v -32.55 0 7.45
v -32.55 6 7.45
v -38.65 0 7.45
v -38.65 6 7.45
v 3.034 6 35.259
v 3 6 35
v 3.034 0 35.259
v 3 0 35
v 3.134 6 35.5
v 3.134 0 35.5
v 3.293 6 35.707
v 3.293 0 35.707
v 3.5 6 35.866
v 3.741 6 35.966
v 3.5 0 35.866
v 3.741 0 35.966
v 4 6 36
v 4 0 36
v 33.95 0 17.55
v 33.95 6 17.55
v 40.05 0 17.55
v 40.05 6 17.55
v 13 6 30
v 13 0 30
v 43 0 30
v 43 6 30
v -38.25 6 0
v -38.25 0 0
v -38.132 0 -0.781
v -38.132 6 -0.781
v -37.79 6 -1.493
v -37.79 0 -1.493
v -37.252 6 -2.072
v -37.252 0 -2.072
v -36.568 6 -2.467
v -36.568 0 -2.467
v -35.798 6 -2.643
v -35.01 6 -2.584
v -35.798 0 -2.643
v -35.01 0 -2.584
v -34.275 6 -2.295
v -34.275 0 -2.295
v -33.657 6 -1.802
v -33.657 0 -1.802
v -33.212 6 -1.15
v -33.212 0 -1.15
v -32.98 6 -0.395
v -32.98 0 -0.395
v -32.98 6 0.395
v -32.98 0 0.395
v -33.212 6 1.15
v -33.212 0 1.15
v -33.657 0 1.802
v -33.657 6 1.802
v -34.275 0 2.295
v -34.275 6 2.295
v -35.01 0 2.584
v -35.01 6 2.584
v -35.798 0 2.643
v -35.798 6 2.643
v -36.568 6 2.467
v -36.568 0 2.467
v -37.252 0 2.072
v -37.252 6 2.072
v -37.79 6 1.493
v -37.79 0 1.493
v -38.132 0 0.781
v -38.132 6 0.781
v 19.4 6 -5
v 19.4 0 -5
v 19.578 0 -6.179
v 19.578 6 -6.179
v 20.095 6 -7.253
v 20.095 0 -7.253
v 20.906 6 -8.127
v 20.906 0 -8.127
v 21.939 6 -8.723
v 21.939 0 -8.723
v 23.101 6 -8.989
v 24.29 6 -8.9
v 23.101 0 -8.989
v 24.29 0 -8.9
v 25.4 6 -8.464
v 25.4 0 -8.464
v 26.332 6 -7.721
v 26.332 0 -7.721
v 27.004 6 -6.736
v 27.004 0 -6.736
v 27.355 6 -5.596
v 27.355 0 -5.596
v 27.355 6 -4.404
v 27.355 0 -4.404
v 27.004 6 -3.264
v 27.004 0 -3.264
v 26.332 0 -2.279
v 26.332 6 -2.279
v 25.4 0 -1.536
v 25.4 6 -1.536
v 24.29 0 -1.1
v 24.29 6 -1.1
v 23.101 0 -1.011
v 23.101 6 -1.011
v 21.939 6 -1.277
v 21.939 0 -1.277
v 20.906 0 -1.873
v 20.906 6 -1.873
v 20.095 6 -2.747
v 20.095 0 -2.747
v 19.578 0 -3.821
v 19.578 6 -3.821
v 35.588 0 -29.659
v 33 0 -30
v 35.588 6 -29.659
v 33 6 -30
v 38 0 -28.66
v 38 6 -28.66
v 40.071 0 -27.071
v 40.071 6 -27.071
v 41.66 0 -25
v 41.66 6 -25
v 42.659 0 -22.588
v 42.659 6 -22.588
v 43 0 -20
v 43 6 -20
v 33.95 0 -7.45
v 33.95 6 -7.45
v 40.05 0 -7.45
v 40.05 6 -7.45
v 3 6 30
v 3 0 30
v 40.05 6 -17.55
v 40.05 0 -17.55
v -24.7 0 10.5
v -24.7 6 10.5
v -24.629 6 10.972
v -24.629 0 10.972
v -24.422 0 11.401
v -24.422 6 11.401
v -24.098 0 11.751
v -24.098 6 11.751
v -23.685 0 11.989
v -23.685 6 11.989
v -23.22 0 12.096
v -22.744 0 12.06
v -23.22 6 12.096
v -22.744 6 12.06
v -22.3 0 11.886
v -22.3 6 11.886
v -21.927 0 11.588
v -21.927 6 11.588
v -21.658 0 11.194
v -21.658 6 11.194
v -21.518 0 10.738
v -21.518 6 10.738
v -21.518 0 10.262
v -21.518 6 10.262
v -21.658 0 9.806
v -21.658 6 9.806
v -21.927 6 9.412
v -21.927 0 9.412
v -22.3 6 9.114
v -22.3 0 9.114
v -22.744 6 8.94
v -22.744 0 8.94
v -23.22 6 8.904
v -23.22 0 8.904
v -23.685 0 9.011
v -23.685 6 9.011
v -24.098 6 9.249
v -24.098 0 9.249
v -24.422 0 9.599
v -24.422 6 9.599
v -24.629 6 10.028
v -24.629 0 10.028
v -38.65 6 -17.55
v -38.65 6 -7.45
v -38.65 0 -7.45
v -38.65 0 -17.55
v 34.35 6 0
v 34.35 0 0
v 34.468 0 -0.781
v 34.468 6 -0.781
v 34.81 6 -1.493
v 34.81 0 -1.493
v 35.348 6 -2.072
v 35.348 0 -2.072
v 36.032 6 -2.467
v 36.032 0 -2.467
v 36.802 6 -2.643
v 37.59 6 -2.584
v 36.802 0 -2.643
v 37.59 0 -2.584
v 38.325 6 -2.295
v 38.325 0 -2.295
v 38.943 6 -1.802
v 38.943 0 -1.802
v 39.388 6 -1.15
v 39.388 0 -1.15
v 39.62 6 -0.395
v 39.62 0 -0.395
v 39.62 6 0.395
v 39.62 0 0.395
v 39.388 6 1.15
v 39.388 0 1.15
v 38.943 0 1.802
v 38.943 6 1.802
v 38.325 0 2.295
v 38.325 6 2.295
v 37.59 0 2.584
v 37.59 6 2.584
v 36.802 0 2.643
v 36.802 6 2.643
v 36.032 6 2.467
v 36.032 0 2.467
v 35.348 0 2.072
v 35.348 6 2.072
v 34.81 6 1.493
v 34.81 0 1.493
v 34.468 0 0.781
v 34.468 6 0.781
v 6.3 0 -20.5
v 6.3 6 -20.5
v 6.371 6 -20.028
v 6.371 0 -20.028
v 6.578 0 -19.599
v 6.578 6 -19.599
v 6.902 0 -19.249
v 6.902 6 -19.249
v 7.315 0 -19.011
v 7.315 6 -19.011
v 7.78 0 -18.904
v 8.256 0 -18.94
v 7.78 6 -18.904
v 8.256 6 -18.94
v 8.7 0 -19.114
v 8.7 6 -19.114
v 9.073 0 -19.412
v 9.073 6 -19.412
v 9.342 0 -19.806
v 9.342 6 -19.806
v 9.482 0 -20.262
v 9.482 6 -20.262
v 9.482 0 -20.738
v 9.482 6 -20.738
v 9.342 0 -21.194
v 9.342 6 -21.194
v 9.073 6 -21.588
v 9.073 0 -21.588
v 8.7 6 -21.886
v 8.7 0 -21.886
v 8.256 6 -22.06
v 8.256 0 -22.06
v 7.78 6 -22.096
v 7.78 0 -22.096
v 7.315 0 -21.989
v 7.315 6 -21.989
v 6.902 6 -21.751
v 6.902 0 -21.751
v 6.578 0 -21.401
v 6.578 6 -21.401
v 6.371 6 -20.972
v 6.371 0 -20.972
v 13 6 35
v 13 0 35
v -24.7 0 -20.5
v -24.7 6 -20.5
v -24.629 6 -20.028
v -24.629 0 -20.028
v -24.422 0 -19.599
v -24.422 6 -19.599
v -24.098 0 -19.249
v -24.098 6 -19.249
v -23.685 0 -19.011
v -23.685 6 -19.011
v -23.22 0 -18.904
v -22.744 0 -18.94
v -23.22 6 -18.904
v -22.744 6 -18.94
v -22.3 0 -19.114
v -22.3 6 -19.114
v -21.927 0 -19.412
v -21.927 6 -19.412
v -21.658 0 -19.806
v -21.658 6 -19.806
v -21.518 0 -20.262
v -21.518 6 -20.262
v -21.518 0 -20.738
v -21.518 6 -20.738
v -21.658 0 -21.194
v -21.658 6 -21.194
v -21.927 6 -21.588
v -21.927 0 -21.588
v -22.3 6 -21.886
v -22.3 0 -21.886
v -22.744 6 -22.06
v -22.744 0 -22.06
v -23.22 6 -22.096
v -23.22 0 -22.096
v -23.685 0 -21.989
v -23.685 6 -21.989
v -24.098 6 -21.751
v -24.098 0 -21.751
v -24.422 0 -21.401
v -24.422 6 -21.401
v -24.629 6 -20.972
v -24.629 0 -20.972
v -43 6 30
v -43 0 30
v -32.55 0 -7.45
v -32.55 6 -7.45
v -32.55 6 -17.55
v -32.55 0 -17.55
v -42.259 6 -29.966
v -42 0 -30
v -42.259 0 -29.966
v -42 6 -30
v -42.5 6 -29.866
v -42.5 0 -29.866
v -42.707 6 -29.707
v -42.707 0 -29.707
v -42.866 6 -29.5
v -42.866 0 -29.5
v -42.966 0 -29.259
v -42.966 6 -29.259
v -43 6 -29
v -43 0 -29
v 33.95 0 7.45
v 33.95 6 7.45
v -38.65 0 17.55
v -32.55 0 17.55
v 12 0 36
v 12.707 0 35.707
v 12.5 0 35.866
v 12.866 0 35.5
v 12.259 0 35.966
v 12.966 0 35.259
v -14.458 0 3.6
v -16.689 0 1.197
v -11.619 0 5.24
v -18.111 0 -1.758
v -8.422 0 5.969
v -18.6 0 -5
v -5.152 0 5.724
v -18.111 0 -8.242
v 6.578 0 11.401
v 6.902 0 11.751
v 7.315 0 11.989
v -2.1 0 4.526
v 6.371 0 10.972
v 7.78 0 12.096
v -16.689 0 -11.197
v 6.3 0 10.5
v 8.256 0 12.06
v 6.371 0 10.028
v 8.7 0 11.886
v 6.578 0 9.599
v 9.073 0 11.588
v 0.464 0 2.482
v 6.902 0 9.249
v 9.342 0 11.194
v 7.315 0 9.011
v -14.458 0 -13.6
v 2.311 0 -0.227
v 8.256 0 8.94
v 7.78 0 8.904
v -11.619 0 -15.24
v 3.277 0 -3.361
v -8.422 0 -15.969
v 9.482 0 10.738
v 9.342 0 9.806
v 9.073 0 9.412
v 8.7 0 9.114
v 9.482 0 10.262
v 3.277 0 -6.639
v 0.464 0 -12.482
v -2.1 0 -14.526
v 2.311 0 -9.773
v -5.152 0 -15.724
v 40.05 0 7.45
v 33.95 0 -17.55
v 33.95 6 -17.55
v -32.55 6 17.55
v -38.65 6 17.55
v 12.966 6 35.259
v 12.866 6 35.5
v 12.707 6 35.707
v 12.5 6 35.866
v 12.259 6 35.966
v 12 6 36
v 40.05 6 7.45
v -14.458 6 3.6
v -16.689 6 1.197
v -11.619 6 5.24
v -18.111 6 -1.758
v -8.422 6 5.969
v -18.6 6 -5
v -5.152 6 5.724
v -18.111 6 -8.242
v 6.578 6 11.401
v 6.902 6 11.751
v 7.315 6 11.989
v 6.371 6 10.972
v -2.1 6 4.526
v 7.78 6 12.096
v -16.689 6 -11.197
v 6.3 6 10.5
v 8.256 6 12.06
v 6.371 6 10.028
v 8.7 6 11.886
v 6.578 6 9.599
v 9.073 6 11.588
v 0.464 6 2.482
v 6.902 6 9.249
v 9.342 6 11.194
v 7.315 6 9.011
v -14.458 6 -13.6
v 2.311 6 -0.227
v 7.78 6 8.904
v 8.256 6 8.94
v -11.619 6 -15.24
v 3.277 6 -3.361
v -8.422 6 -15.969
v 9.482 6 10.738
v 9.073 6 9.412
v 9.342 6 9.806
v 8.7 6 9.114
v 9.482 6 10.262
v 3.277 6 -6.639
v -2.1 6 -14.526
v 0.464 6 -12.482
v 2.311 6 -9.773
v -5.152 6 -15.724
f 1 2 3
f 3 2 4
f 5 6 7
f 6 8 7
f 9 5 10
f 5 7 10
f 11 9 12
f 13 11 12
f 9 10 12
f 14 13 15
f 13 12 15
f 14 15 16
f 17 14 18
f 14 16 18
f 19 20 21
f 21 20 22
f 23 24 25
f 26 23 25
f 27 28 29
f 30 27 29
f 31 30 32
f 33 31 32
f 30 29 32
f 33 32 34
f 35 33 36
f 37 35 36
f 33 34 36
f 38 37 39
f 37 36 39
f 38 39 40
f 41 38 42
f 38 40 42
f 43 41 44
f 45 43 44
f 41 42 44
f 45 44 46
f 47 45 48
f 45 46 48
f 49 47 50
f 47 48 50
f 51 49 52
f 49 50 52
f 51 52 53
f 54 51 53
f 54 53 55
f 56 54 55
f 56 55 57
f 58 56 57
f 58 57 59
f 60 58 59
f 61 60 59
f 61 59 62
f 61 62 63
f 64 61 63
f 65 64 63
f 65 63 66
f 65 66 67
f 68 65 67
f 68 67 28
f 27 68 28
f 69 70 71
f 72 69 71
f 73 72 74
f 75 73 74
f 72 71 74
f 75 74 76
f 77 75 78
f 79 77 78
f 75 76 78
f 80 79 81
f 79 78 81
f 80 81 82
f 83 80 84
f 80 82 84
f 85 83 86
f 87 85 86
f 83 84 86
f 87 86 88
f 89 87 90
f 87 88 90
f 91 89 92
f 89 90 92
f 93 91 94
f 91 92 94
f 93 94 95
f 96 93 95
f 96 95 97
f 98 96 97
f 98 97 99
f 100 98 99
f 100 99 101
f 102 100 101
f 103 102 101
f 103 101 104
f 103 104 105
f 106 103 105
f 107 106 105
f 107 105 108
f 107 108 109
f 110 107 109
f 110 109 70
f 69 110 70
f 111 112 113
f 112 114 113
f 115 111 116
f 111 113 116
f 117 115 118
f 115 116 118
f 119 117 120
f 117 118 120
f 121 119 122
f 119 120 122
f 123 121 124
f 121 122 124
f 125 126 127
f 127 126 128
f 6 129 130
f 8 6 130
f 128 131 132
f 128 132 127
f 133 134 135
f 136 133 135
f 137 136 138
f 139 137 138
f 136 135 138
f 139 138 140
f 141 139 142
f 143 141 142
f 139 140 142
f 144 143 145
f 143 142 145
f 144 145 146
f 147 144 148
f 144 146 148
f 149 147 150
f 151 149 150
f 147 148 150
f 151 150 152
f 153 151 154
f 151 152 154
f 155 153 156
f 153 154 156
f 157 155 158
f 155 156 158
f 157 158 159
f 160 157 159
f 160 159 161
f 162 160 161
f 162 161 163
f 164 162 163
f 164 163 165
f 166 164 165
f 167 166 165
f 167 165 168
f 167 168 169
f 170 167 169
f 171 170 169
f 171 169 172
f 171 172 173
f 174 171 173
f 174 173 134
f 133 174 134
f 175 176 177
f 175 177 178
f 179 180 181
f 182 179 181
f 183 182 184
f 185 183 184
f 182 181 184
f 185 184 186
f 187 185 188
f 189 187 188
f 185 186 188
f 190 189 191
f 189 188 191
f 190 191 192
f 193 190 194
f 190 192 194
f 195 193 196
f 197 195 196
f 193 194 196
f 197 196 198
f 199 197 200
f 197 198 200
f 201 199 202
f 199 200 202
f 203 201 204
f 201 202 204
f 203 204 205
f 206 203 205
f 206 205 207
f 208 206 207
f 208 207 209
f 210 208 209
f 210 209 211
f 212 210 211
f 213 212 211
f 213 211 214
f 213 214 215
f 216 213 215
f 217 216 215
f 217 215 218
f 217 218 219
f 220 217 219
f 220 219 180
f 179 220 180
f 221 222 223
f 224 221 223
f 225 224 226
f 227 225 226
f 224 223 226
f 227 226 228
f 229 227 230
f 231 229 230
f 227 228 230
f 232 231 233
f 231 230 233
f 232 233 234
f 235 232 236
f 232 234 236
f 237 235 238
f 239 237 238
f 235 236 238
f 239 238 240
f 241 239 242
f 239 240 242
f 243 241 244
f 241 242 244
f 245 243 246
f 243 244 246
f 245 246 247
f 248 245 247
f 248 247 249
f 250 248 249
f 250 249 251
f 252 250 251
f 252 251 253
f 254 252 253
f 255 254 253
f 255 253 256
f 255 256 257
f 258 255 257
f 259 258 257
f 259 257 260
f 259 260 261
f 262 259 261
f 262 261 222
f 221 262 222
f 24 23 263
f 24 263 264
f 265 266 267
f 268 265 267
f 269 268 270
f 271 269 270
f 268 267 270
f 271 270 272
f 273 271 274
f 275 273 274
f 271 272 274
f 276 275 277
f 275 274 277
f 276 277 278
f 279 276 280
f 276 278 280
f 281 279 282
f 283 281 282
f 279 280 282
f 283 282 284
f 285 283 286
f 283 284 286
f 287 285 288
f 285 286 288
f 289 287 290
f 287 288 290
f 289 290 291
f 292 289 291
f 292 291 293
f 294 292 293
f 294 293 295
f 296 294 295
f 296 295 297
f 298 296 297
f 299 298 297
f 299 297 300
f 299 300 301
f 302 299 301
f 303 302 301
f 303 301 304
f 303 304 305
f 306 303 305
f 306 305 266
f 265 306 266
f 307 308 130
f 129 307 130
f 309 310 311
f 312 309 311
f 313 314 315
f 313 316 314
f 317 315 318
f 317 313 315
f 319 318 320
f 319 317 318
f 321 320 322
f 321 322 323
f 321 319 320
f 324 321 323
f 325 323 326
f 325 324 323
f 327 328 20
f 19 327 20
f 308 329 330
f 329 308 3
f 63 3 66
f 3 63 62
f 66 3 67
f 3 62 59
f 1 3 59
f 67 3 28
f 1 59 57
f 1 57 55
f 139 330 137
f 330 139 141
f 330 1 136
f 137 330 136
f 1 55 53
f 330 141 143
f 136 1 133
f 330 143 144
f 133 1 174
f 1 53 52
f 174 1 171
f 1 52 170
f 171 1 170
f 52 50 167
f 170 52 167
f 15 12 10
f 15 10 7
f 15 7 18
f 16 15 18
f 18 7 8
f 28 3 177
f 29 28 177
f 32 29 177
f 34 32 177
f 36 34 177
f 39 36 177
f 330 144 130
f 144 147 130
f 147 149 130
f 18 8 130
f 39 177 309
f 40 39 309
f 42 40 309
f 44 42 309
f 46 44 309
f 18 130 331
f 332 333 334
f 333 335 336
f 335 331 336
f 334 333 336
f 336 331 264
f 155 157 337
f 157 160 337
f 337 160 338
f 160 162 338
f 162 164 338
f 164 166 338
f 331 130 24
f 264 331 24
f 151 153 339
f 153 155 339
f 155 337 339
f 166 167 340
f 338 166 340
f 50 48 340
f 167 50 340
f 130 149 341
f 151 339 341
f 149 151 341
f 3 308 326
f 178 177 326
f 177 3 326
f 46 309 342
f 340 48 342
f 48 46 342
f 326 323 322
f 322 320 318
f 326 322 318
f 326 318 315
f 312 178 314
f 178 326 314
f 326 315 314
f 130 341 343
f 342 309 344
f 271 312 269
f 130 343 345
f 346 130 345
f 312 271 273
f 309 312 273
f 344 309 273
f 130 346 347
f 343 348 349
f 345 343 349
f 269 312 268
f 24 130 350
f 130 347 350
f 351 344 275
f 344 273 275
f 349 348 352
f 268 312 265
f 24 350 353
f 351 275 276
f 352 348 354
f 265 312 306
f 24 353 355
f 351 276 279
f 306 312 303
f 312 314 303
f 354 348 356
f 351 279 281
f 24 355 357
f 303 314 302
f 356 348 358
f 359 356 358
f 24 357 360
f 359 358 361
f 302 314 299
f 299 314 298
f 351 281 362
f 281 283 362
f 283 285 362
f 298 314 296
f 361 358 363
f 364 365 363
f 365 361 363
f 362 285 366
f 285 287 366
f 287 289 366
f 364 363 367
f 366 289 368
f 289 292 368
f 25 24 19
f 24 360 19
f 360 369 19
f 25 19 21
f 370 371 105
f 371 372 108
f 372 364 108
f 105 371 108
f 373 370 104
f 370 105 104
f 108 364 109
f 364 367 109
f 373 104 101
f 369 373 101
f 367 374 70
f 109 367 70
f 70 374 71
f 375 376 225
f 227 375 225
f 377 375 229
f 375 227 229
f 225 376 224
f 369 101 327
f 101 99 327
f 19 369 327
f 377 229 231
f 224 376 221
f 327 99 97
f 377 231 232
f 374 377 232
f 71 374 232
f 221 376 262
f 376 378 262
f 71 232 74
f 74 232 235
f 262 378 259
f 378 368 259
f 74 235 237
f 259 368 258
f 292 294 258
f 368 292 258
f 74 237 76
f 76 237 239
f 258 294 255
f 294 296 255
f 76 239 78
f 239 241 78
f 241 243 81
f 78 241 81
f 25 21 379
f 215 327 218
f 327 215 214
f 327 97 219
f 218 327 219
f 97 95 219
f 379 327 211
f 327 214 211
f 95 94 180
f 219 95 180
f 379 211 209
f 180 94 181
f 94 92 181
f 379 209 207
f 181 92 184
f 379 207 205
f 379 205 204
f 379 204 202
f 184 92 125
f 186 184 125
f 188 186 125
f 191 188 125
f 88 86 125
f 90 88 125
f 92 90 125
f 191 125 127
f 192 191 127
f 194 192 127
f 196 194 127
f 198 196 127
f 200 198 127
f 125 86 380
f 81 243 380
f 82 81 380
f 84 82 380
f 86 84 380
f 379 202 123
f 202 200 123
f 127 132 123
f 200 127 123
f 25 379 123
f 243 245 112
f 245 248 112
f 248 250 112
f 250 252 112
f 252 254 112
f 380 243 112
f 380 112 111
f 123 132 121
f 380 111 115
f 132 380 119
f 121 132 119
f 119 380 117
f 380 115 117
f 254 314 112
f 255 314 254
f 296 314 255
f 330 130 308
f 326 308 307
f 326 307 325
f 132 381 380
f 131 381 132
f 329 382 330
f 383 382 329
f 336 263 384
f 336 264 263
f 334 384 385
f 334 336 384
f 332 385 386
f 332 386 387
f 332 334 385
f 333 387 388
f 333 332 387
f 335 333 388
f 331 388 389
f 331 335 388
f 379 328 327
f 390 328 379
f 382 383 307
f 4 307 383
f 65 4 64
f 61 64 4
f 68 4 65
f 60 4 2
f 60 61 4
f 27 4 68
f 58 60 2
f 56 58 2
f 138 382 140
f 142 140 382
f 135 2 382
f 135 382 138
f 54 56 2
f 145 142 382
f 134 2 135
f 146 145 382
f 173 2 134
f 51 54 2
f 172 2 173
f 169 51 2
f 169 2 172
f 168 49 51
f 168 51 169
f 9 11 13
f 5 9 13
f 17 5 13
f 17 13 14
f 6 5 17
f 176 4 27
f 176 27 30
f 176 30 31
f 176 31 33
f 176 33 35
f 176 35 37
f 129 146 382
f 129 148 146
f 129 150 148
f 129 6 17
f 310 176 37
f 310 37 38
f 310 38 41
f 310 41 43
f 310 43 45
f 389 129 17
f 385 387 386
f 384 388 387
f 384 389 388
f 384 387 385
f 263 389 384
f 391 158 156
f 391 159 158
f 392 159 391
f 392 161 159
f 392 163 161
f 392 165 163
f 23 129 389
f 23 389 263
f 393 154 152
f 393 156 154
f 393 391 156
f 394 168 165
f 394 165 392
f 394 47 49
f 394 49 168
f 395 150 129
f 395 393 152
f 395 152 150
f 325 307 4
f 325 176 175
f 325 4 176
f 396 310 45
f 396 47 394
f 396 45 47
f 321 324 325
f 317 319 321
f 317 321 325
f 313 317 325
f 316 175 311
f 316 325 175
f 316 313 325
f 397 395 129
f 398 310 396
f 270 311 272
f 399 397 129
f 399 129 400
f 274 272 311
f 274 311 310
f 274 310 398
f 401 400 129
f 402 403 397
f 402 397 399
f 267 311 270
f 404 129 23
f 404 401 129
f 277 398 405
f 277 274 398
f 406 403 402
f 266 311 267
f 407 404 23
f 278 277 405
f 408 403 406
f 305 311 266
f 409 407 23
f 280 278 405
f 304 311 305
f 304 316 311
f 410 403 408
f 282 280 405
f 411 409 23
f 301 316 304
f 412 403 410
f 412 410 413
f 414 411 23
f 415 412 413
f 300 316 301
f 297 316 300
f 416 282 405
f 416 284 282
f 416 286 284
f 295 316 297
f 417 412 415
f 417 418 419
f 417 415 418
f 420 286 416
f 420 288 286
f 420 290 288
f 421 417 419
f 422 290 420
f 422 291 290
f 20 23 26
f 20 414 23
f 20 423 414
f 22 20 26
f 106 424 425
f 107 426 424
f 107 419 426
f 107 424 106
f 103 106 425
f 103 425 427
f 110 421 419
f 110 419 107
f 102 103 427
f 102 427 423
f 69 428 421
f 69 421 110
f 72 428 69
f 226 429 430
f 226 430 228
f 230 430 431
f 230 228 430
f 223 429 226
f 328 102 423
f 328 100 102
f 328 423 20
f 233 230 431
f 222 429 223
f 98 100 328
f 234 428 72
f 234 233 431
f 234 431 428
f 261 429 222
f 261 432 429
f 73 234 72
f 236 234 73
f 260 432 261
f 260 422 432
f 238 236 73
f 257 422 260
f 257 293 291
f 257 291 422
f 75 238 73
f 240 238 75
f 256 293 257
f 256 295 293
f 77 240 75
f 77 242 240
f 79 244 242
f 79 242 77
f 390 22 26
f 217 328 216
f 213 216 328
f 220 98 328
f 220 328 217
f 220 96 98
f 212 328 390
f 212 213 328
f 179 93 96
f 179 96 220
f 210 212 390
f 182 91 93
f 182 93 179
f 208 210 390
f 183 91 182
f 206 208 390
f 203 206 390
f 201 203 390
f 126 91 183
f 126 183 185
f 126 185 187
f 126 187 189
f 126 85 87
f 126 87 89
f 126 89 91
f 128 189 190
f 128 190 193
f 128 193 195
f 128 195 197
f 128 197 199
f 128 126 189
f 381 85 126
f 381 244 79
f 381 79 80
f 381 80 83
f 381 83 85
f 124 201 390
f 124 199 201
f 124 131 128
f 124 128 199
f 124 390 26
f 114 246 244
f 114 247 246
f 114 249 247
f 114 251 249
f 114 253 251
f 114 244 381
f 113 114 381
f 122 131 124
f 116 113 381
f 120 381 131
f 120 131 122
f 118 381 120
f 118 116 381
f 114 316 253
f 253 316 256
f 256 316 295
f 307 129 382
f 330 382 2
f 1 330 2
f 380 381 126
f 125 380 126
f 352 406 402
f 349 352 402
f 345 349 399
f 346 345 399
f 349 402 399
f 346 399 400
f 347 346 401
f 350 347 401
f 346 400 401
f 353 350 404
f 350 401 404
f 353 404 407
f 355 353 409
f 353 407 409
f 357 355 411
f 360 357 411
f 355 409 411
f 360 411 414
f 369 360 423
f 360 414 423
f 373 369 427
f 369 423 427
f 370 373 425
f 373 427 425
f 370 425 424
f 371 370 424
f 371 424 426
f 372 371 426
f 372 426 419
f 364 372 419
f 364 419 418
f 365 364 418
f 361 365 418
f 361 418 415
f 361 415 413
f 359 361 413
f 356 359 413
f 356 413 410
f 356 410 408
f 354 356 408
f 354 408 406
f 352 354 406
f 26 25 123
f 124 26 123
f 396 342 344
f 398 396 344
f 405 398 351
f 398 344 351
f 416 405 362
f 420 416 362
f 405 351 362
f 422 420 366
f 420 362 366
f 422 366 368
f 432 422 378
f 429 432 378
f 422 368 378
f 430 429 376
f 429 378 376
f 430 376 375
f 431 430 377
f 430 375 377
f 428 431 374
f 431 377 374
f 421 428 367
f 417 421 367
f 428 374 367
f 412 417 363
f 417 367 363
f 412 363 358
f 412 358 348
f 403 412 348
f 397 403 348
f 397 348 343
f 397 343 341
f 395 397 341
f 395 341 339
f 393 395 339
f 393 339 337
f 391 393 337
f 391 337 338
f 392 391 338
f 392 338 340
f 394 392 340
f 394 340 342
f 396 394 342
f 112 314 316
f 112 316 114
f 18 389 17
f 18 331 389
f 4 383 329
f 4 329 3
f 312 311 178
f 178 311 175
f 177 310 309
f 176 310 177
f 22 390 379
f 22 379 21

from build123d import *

# Parameters (mm, degrees)
SKETCH1_W                = 86
SKETCH1_H                = 60
BOSS_EXTRUDE1_DEPTH      = 6
M5_CLEARANCE_HOLE1_D     = 5.3
FILLET1_R                = 10
M5_CLEARANCE_HOLE2_D     = 5.3
F_8_0_8_DIAMETER_HOLE1_D = 8
M3_CLEARANCE_HOLE1_D     = 3.2
SKETCH6_R                = 11
CUT_EXTRUDE3_DEPTH       = 7
FILLET1343_R             = 1
SKETCH73_W               = 6.1
SKETCH73_H               = 10.1
CUT_EXTRUDE24_DEPTH      = 4
CUT_EXTRUDE24_DEPTH_BACK = 4
SKETCH74_W               = 6.1
SKETCH74_H               = 10.1
CUT_EXTRUDE25_DEPTH      = 4
CUT_EXTRUDE25_DEPTH_BACK = 4
SKETCH2349_W             = 10
SKETCH2349_H             = 6
BOSS_EXTRUDE2347_DEPTH   = 6
FILLET1346_R             = 1


with BuildPart() as part:
    # Sketch1 → Boss-Extrude1 (new body)
    with BuildSketch(Plane(origin=(0, 0, 0), x_dir=(1, 0, 0), z_dir=(0, 1, 0))):
        Rectangle(SKETCH1_W, SKETCH1_H)
    extrude(amount=BOSS_EXTRUDE1_DEPTH)

    # M5 Clearance Hole1 (through all)
    with Locations(Plane(origin=(0, 6, 0), x_dir=(1, 0, 0), z_dir=(0, 1, 0))):
        with Locations((-35.6, 0)):
            Hole(M5_CLEARANCE_HOLE1_D / 2)

    # Fillet1
    fillet1_edges = [part.edges().sort_by_distance(p)[0] for p in [
        (43, 3, -30),
    ]]
    fillet(fillet1_edges, radius=FILLET1_R)

    # M5 Clearance Hole2 (through all)
    with Locations(Plane(origin=(0, 6, 0), x_dir=(1, 0, 0), z_dir=(0, 1, 0))):
        with Locations((37, 0)):
            Hole(M5_CLEARANCE_HOLE2_D / 2)

    # 8.0 _8_ Diameter Hole1 (through all)
    with Locations(Plane(origin=(0, 6, 0), x_dir=(1, 0, 0), z_dir=(0, 1, 0))):
        with Locations((23.4, 5)):
            Hole(F_8_0_8_DIAMETER_HOLE1_D / 2)

    # M3 Clearance Hole1 (through all)
    with Locations(Plane(origin=(-7.6, 0, -5), x_dir=(1, 0, 0), z_dir=(0, -1, 0))):
        with Locations((15.5, -15.5), (-15.5, -15.5), (-15.5, 15.5), (15.5, 15.5)):
            Hole(M3_CLEARANCE_HOLE1_D / 2)

    # Sketch6 → Cut-Extrude3 (cut, through all)
    with BuildSketch(Plane(origin=(-7.6, 0, -5), x_dir=(-1, 0, 0), z_dir=(0, -1, 0))):
        Circle(SKETCH6_R)
    extrude(amount=-CUT_EXTRUDE3_DEPTH, mode=Mode.SUBTRACT)

    # Fillet1343
    fillet1343_edges = [part.edges().sort_by_distance(p)[0] for p in [
        (-43, 3, -30),
    ]]
    fillet(fillet1343_edges, radius=FILLET1343_R)

    # Sketch73 → Cut-Extrude24 (cut, two sides)
    with BuildSketch(Plane(origin=(8.4, 3, -20), x_dir=(-1, 0, 0), z_dir=(0, -1, 0))) as cut_extrude24_sk:
        with Locations((44, -32.5)):
            Rectangle(SKETCH73_W, SKETCH73_H)
        with Locations((44, -7.5)):
            Rectangle(SKETCH73_W, SKETCH73_H)
    extrude(amount=CUT_EXTRUDE24_DEPTH, mode=Mode.SUBTRACT)
    extrude(cut_extrude24_sk.sketch, amount=-CUT_EXTRUDE24_DEPTH_BACK, mode=Mode.SUBTRACT)

    # Sketch74 → Cut-Extrude25 (cut, two sides)
    with BuildSketch(Plane(origin=(-7, 3, 20), x_dir=(1, 0, 0), z_dir=(0, -1, 0))) as cut_extrude25_sk:
        with Locations((44, -32.5)):
            Rectangle(SKETCH74_W, SKETCH74_H)
        with Locations((44, -7.5)):
            Rectangle(SKETCH74_W, SKETCH74_H)
    extrude(amount=CUT_EXTRUDE25_DEPTH, mode=Mode.SUBTRACT)
    extrude(cut_extrude25_sk.sketch, amount=-CUT_EXTRUDE25_DEPTH_BACK, mode=Mode.SUBTRACT)

    # Sketch2349 → Boss-Extrude2347 (add)
    with BuildSketch(Plane(origin=(8.767778608, 6, 30), x_dir=(-1, 0, 0), z_dir=(0, 0, 1))):
        with Locations((0.767778608, 3)):
            Rectangle(SKETCH2349_W, SKETCH2349_H)
    extrude(amount=BOSS_EXTRUDE2347_DEPTH)

    # Fillet1346
    fillet1346_edges = [part.edges().sort_by_distance(p)[0] for p in [
        (13, 3, 36),
        (3, 3, 36),
    ]]
    fillet(fillet1346_edges, radius=FILLET1346_R)


solid = part.part
